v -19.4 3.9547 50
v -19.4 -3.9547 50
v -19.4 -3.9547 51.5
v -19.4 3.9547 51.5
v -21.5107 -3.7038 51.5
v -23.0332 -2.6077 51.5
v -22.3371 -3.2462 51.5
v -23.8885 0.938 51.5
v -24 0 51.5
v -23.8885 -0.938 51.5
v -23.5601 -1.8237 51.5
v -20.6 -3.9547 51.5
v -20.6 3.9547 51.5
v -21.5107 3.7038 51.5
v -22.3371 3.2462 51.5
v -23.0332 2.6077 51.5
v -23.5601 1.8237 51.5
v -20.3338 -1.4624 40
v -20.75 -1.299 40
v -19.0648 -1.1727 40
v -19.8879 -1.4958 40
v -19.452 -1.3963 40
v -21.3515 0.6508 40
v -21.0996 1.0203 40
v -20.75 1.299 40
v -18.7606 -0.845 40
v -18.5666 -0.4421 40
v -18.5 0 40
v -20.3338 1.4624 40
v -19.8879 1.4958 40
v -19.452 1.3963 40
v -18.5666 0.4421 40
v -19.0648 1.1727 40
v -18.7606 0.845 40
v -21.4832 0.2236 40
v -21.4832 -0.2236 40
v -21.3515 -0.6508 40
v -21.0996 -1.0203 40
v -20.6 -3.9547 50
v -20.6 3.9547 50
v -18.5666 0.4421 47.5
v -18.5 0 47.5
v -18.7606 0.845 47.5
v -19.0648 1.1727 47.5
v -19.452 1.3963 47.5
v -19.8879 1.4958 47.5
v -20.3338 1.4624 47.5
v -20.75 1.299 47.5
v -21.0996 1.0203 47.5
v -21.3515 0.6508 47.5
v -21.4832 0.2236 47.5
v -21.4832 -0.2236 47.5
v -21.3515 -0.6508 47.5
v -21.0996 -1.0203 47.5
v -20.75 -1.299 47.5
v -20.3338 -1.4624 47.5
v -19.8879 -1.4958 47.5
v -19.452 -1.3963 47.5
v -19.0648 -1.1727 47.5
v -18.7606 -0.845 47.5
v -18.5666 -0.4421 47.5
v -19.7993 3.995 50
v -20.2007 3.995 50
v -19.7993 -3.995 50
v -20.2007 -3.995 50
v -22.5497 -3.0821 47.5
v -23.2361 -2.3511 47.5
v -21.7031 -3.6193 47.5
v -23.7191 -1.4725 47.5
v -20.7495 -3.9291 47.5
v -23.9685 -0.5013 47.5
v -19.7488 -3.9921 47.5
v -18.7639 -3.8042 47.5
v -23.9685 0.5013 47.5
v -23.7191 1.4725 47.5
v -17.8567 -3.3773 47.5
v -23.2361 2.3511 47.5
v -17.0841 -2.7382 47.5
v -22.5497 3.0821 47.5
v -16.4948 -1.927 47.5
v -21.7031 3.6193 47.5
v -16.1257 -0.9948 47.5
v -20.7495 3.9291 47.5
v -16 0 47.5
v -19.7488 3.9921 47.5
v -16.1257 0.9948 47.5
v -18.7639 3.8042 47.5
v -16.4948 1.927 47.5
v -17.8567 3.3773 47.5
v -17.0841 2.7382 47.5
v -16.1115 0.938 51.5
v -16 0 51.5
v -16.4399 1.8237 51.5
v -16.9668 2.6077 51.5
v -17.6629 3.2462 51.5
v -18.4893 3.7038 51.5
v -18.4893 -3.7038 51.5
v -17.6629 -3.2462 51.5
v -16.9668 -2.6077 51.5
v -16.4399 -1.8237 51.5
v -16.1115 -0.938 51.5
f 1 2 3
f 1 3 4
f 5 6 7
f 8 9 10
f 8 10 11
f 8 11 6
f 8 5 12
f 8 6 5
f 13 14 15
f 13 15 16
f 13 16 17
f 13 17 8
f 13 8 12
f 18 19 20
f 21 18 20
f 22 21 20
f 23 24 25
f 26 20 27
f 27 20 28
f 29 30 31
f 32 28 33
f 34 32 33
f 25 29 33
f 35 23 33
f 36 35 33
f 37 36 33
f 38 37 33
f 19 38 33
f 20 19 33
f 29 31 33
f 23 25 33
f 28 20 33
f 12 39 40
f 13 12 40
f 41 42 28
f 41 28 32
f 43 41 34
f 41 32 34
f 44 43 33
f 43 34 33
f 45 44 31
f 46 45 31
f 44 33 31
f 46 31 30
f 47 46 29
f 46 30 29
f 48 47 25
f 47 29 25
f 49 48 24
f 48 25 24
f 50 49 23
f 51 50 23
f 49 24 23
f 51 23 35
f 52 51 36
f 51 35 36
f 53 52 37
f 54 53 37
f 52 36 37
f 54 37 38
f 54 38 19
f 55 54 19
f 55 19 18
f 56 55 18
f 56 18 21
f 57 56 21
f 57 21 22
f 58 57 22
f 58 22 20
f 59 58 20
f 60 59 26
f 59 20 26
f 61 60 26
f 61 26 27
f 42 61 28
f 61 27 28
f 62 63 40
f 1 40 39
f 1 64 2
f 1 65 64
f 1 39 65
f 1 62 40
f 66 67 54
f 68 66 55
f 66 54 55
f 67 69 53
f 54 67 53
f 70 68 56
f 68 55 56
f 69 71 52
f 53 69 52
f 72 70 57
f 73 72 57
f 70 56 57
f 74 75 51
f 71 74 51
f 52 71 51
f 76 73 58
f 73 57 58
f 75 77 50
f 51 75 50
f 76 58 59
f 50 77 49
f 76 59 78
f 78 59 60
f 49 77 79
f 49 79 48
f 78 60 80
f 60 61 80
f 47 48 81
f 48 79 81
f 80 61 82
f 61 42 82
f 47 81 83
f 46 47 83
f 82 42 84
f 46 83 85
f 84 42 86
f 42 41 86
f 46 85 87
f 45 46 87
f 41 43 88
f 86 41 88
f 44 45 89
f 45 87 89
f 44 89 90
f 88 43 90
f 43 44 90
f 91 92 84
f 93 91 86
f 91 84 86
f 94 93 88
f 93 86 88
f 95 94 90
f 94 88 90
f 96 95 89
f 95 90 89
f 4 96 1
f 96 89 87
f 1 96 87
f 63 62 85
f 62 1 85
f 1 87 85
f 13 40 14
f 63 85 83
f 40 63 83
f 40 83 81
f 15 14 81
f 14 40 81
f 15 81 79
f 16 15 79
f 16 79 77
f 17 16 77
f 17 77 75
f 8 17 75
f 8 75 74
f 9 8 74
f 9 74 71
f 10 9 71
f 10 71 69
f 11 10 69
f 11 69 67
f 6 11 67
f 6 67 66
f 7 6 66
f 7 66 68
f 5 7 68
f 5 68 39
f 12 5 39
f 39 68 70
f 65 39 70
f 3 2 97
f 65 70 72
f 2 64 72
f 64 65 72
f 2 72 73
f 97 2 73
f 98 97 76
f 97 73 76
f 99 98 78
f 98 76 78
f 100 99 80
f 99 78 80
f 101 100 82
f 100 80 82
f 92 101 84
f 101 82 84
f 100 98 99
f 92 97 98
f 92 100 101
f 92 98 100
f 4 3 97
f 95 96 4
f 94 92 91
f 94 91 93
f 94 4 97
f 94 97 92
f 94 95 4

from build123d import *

# Parameters (mm, degrees)
M3_THREAD_ENVELOPE_SELECT_HARDWARE_START = 40
SKETCH1_R                                = 1.5
M3_THREAD_ENVELOPE_SELECT_HARDWARE_DEPTH = 7.5
THUMB_HEAD_START                         = 47.5
SKETCH2_R                                = 4
THUMB_HEAD_DEPTH                         = 4
DRIVER_SLOT_START                        = 50
SKETCH3_W                                = 1.2
SKETCH3_H                                = 10
DRIVER_SLOT_DEPTH                        = 3


with BuildPart() as part:
    # Sketch1 → M3_thread_envelope_select_hardware (new body)
    with BuildSketch(Plane.XY.offset(M3_THREAD_ENVELOPE_SELECT_HARDWARE_START)):
        with Locations((-20, 0)):
            Circle(SKETCH1_R)
    extrude(amount=M3_THREAD_ENVELOPE_SELECT_HARDWARE_DEPTH)

    # Sketch2 → Thumb_head (add)
    with BuildSketch(Plane.XY.offset(THUMB_HEAD_START)):
        with Locations((-20, 0)):
            Circle(SKETCH2_R)
    extrude(amount=THUMB_HEAD_DEPTH)

    # Sketch3 → Driver_slot (cut)
    with BuildSketch(Plane.XY.offset(DRIVER_SLOT_START)):
        with Locations((-20, 0)):
            Rectangle(SKETCH3_W, SKETCH3_H)
    extrude(amount=DRIVER_SLOT_DEPTH, mode=Mode.SUBTRACT)


solid = part.part
